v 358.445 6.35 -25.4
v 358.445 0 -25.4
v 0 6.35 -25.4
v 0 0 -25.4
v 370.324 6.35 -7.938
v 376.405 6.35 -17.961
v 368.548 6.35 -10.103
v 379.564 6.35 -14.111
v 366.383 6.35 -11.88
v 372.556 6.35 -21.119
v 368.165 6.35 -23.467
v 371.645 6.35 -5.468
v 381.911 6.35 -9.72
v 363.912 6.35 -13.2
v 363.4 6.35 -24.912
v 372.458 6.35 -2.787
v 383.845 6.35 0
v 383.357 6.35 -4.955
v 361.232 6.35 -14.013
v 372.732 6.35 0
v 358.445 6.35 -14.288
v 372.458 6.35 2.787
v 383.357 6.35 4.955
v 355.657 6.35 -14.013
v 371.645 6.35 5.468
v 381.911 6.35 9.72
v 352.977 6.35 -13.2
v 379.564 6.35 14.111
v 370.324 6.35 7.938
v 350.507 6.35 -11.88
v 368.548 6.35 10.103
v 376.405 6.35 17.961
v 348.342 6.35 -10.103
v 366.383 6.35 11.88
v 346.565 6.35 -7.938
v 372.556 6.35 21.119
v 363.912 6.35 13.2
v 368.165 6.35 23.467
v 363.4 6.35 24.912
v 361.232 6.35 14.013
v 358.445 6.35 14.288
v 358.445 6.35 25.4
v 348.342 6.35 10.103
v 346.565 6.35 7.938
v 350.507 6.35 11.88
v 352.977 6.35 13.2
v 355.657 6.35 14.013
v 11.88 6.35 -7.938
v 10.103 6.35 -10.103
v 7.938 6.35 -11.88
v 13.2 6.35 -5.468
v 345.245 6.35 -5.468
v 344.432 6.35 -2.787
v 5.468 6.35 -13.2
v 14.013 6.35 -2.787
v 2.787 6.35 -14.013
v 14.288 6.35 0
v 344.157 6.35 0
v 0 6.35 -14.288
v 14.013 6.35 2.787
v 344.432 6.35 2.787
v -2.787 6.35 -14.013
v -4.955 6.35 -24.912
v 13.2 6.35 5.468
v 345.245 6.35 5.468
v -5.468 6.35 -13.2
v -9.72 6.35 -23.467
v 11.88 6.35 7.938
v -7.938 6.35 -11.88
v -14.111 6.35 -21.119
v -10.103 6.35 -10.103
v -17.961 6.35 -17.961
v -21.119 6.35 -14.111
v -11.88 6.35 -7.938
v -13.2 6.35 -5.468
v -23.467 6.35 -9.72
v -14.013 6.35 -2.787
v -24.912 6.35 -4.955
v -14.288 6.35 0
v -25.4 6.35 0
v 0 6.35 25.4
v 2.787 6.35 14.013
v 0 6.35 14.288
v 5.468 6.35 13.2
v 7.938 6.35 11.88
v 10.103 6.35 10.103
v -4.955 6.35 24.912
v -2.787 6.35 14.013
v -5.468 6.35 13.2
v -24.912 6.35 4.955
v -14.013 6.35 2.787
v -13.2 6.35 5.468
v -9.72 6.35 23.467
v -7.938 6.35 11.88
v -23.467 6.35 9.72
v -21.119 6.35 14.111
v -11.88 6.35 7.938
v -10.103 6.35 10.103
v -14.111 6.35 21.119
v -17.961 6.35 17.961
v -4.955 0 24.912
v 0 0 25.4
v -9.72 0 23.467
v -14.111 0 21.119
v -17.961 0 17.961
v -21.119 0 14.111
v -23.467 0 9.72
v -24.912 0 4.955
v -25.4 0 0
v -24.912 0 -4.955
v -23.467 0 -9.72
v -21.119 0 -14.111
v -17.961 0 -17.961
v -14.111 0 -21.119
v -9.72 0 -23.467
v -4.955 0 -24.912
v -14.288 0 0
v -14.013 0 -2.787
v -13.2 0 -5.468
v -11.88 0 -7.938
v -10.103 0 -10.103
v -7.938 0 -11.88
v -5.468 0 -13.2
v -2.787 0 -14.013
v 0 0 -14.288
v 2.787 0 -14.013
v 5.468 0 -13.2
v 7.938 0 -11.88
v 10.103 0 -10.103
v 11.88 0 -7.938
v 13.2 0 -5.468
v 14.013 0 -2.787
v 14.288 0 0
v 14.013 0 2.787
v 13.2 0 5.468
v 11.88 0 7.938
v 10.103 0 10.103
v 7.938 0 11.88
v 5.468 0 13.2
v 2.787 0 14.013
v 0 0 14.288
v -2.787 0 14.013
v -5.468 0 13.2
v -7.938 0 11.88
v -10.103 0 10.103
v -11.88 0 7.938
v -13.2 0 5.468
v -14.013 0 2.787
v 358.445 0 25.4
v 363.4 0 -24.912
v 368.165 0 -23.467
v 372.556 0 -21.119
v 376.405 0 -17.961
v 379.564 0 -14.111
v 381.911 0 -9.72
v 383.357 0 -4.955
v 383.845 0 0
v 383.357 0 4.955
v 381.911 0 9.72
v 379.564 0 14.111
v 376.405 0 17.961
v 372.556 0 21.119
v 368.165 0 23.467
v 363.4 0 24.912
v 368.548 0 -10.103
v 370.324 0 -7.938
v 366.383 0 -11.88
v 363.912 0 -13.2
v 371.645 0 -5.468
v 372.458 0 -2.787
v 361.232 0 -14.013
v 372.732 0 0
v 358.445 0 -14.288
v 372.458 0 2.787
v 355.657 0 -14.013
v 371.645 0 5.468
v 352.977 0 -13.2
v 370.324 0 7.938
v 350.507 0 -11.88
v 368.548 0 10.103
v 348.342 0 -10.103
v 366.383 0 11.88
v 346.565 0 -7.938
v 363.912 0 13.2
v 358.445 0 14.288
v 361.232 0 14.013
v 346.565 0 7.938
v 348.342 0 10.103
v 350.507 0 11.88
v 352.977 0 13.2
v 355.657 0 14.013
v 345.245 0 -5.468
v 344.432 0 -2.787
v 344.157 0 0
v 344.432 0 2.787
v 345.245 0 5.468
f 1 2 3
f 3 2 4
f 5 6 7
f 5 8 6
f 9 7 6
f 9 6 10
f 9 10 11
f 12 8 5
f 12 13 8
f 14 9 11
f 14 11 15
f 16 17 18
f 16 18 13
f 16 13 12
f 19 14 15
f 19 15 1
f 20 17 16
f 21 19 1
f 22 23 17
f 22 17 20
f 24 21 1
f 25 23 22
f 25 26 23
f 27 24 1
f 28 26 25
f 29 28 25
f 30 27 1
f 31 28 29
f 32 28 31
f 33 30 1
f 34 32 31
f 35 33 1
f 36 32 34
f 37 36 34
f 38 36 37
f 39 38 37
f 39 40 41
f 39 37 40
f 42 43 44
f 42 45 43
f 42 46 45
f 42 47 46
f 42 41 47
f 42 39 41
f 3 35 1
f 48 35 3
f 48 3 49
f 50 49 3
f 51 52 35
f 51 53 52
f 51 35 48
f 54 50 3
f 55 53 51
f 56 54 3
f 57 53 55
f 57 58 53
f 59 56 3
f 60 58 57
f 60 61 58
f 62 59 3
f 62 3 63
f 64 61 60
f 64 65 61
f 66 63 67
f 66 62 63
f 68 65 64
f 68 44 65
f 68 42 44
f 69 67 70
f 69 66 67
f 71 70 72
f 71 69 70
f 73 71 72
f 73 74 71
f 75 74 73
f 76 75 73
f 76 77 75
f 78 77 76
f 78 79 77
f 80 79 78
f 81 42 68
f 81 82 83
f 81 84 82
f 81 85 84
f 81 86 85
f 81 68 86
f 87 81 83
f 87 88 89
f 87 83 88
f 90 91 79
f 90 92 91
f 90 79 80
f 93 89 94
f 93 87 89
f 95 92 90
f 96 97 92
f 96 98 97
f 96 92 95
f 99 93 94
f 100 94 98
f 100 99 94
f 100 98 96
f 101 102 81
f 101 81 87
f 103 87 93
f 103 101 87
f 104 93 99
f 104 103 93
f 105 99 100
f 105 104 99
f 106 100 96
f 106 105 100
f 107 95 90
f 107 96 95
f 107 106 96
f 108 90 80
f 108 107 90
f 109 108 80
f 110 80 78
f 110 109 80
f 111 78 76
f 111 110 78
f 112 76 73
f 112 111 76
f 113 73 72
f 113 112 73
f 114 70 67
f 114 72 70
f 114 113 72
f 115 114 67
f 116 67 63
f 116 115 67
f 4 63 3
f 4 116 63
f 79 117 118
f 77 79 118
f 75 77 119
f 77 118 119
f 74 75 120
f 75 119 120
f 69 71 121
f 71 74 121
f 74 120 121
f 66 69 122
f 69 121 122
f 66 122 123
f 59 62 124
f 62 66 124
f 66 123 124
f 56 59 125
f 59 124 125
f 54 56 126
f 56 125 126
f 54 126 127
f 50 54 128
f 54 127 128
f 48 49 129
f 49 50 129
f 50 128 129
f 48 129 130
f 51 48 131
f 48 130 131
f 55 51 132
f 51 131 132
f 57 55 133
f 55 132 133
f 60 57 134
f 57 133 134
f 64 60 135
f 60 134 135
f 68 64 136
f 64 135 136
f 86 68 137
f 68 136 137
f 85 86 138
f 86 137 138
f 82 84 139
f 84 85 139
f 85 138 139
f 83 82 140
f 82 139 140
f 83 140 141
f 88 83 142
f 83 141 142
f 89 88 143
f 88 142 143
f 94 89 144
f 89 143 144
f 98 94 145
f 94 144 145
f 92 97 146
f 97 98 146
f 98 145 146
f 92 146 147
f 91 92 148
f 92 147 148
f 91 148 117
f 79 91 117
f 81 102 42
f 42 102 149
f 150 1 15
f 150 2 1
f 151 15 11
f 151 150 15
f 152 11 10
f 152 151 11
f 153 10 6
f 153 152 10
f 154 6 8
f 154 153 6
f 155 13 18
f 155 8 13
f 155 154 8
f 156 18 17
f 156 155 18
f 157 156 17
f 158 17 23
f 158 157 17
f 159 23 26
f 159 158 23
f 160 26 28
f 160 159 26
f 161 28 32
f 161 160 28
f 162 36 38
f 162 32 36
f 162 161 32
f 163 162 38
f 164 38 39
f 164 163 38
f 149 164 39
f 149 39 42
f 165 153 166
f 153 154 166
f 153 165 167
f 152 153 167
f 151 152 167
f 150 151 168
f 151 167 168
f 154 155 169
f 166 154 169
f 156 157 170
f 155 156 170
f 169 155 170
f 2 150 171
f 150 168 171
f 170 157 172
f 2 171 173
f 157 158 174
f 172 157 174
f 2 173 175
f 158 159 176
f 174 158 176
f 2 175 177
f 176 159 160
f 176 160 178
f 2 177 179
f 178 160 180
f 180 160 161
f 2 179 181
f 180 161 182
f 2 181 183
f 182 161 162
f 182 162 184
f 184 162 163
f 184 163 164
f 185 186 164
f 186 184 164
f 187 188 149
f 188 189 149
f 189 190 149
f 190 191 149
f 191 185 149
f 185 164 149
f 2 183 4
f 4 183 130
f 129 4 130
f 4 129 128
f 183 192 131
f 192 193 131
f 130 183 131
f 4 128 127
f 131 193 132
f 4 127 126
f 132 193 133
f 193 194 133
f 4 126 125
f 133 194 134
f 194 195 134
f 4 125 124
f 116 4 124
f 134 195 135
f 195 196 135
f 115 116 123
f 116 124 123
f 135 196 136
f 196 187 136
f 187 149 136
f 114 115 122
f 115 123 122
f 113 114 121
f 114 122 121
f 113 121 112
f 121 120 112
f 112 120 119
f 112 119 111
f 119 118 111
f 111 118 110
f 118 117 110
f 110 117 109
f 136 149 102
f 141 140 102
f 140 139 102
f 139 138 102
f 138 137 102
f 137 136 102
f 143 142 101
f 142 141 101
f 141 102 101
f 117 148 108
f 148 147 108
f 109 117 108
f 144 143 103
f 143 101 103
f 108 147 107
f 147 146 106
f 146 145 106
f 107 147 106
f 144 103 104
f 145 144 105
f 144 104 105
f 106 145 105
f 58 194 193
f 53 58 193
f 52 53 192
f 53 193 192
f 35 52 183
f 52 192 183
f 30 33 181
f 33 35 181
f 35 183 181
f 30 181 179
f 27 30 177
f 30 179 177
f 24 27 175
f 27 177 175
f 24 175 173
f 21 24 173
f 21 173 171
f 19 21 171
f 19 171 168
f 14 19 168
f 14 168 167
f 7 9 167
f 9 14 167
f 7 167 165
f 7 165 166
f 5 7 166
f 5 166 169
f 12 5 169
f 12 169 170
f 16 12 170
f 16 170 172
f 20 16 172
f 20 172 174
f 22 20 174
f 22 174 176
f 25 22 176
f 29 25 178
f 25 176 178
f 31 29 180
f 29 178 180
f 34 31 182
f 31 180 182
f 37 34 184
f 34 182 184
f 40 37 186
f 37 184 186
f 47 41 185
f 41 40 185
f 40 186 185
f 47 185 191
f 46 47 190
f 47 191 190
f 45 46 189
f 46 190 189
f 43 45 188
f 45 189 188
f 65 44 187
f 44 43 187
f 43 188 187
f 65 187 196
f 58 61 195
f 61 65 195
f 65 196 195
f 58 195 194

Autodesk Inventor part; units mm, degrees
ref_plane "YZ Plane" through (0, 0, 0) normal (1, 0, 0) x (0, 1, 0)
ref_plane "XZ Plane" through (0, 0, 0) normal (0, 1, 0) x (-1, 0, 0)
ref_plane "XY Plane" through (0, 0, 0) normal (0, 0, 1) x (1, 0, 0)
sketch "Sketch1" plane through (0, 0, 0) normal (0, 1, 0) x (-1, 0, 0)
  line L0 (0, 0) -> (-358.4448, 0)
  line L1 (0, 0) -> (-358.4448, 0) construction
  line L2 (0, 0) -> (-358.4448, 0) construction
  line L3 (0, 25.4) -> (-358.4448, 25.4)
  line L4 (-358.4448, -25.4) -> (0, -25.4)
  arc A0 (0, -25.4) -> (0, 25.4) centre (0, 0) ccw
  arc A1 (-358.4448, 25.4) -> (-358.4448, -25.4) centre (-358.4448, 0) ccw
  circle A2 centre (0, 0) radius 14.2875
  circle A3 centre (-358.4448, 0) radius 14.2875
  point P0 (-179.2224, 0)
  point P1 (-179.2224, 0)
  dimension "d0" = 358.4448
  dimension "d8" = 50.8
  dimension "d9" = 28.575
  dimension "d10" = 28.575
extrude "Extrusion1" add sketch "Sketch1" along normal blind 6.35
properties part number "4-bar intake (14.112) bar"
